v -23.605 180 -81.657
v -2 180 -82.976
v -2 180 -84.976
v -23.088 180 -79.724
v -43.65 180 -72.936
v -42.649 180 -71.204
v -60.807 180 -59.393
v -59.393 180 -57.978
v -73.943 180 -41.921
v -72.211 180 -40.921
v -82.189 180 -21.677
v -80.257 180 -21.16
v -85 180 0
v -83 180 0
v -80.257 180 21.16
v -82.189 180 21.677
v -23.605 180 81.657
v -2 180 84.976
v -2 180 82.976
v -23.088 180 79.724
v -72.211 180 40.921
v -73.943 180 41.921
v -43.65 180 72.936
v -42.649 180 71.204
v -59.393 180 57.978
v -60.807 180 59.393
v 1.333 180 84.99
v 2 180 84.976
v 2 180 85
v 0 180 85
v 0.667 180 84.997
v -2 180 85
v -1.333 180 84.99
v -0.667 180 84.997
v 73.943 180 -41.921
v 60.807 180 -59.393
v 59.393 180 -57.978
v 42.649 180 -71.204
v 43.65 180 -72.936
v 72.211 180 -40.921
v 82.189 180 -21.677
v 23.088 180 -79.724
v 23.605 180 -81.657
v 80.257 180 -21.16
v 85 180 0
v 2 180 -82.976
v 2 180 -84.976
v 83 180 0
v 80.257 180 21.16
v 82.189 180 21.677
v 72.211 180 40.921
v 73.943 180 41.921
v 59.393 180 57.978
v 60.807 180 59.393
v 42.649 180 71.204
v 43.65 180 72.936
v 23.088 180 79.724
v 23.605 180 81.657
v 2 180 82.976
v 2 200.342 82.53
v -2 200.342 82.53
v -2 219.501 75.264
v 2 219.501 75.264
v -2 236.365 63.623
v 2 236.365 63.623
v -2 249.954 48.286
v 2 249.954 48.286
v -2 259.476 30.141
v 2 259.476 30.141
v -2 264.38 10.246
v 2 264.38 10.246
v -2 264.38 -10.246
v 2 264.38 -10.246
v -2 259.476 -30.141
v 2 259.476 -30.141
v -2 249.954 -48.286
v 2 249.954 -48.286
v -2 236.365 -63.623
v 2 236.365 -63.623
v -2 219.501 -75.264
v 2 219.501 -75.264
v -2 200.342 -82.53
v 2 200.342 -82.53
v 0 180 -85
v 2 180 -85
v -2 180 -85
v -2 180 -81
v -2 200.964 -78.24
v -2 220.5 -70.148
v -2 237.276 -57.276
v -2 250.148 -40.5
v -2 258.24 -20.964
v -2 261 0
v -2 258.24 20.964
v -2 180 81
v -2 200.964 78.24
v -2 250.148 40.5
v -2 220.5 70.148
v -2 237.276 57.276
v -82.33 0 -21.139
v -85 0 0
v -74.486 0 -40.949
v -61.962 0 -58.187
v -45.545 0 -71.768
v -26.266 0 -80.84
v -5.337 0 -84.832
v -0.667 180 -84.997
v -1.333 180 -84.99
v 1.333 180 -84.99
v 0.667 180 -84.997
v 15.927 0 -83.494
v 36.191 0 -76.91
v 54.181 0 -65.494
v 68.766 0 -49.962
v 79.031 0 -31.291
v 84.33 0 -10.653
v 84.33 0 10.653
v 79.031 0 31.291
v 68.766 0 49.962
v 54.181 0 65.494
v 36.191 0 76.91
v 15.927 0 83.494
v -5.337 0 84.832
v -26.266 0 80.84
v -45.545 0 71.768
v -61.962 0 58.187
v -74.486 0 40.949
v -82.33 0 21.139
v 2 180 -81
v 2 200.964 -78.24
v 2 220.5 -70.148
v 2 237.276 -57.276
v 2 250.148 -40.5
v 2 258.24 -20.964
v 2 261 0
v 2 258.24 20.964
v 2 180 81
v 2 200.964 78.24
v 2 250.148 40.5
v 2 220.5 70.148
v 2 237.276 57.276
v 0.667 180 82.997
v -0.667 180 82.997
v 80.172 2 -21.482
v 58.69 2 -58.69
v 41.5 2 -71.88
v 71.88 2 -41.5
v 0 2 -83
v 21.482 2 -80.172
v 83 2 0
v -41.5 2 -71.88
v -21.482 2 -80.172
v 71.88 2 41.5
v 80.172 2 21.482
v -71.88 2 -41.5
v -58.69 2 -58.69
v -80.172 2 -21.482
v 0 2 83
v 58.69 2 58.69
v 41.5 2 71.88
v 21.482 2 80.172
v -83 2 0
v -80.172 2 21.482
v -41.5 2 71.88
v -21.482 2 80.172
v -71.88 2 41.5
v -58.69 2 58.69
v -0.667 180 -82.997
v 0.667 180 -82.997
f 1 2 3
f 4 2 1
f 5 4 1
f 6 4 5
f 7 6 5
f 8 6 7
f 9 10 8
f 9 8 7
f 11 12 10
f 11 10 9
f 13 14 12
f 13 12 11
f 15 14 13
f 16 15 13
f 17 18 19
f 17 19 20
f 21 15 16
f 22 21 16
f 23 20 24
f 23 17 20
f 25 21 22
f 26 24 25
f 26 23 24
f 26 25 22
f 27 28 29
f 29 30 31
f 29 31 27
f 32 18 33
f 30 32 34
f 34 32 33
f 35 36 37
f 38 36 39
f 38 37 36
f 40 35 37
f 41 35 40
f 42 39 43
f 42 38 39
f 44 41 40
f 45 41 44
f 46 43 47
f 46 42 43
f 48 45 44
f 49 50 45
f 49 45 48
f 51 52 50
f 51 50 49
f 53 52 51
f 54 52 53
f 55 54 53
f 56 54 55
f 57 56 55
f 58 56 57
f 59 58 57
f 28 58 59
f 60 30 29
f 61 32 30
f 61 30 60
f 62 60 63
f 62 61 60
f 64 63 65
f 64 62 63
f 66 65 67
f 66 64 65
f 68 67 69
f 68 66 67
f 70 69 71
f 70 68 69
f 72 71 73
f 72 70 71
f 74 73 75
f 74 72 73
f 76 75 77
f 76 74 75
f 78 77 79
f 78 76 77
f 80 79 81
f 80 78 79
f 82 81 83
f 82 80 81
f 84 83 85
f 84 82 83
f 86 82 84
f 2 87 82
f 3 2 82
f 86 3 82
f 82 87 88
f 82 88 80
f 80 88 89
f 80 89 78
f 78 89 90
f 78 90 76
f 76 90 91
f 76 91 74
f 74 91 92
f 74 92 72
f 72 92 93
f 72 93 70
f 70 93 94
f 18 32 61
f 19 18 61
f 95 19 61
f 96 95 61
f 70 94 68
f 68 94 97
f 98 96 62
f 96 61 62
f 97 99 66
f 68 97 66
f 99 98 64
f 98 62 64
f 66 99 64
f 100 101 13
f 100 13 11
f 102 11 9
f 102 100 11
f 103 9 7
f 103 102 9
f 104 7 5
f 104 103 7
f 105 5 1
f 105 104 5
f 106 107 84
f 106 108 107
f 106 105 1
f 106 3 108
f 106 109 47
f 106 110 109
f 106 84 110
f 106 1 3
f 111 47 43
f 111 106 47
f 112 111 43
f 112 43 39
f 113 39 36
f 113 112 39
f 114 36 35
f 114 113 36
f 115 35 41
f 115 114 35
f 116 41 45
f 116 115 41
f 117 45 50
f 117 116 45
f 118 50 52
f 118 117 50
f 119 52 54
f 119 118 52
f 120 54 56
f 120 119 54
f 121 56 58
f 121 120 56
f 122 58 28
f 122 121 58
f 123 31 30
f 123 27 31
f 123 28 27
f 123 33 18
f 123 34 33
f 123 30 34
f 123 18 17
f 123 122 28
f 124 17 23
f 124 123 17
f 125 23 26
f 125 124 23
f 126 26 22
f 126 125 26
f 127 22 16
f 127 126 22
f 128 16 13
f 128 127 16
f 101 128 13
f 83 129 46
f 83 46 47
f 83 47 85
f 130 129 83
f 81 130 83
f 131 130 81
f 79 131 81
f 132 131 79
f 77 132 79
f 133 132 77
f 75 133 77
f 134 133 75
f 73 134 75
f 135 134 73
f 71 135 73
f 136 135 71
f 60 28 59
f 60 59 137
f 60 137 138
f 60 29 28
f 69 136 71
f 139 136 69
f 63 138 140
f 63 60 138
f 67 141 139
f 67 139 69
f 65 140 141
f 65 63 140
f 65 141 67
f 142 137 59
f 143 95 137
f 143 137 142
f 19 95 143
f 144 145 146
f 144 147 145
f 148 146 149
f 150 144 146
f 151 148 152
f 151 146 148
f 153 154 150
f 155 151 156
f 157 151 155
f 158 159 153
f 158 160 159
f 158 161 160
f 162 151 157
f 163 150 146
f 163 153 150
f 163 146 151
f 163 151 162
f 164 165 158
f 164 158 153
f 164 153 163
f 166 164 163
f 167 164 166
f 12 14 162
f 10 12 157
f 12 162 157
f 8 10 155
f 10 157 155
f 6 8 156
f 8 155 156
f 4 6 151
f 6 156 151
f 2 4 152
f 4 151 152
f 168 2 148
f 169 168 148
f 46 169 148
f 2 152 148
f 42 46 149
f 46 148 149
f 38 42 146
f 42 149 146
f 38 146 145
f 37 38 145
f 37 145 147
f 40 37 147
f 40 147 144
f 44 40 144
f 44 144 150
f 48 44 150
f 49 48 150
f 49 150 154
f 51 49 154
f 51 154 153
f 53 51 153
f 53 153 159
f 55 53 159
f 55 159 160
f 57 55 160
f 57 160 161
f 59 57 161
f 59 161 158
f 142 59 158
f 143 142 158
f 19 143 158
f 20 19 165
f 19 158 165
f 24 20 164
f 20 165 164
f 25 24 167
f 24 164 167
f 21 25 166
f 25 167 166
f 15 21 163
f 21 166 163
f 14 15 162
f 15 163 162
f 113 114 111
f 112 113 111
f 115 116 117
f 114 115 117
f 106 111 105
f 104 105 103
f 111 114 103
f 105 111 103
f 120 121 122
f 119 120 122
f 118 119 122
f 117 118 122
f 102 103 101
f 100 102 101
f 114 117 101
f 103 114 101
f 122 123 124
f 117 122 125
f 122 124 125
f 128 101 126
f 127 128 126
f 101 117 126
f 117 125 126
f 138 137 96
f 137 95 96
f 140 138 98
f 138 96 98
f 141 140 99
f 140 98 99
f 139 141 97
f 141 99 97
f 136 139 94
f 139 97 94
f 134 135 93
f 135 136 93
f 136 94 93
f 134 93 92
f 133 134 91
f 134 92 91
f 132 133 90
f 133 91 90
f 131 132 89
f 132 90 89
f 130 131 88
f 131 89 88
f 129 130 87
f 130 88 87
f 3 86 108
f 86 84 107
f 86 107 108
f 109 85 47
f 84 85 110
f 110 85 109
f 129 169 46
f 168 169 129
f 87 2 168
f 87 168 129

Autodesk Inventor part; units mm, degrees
ref_plane "YZ Plane" through (0, 0, 0) normal (1, 0, 0) x (0, 1, 0)
ref_plane "XZ Plane" through (0, 0, 0) normal (0, 1, 0) x (-1, 0, 0)
ref_plane "XY Plane" through (0, 0, 0) normal (0, 0, 1) x (1, 0, 0)
sketch "Sketch1" plane through (0, 0, 0) normal (0, 1, 0) x (-1, 0, 0)
  circle A0 centre (0, 0) radius 85
  dimension "d0" = 170
extrude "Extrusion1" add sketch "Sketch1" along normal blind 180
shell "Shell1" thickness 2 removed faces 1 at (4.1372, 180, 51.3099)
sketch "Sketch2" plane through (0, 0, 0) normal (1, 0, 0) x (0, 1, 0)
  line L0 (180, -85) -> (180, 85) projected
  line L1 (0, 85) -> (0, -85) projected
  arc A0 (180, -85) -> (180, 85) centre (180, 0) ccw
  line L2 (0, 85) -> (180, 85) projected
  line L3 (0, -85) -> (180, -85) projected
  arc A1 (180, -81) -> (180, 81) centre (180, 0) ccw
  point P0 (0, 0)
  dimension "d4" = 4
extrude "Extrusion2" add sketch "Sketch2" along normal mid plane 4 contours L0 A1 A0
properties part number "emmer"
